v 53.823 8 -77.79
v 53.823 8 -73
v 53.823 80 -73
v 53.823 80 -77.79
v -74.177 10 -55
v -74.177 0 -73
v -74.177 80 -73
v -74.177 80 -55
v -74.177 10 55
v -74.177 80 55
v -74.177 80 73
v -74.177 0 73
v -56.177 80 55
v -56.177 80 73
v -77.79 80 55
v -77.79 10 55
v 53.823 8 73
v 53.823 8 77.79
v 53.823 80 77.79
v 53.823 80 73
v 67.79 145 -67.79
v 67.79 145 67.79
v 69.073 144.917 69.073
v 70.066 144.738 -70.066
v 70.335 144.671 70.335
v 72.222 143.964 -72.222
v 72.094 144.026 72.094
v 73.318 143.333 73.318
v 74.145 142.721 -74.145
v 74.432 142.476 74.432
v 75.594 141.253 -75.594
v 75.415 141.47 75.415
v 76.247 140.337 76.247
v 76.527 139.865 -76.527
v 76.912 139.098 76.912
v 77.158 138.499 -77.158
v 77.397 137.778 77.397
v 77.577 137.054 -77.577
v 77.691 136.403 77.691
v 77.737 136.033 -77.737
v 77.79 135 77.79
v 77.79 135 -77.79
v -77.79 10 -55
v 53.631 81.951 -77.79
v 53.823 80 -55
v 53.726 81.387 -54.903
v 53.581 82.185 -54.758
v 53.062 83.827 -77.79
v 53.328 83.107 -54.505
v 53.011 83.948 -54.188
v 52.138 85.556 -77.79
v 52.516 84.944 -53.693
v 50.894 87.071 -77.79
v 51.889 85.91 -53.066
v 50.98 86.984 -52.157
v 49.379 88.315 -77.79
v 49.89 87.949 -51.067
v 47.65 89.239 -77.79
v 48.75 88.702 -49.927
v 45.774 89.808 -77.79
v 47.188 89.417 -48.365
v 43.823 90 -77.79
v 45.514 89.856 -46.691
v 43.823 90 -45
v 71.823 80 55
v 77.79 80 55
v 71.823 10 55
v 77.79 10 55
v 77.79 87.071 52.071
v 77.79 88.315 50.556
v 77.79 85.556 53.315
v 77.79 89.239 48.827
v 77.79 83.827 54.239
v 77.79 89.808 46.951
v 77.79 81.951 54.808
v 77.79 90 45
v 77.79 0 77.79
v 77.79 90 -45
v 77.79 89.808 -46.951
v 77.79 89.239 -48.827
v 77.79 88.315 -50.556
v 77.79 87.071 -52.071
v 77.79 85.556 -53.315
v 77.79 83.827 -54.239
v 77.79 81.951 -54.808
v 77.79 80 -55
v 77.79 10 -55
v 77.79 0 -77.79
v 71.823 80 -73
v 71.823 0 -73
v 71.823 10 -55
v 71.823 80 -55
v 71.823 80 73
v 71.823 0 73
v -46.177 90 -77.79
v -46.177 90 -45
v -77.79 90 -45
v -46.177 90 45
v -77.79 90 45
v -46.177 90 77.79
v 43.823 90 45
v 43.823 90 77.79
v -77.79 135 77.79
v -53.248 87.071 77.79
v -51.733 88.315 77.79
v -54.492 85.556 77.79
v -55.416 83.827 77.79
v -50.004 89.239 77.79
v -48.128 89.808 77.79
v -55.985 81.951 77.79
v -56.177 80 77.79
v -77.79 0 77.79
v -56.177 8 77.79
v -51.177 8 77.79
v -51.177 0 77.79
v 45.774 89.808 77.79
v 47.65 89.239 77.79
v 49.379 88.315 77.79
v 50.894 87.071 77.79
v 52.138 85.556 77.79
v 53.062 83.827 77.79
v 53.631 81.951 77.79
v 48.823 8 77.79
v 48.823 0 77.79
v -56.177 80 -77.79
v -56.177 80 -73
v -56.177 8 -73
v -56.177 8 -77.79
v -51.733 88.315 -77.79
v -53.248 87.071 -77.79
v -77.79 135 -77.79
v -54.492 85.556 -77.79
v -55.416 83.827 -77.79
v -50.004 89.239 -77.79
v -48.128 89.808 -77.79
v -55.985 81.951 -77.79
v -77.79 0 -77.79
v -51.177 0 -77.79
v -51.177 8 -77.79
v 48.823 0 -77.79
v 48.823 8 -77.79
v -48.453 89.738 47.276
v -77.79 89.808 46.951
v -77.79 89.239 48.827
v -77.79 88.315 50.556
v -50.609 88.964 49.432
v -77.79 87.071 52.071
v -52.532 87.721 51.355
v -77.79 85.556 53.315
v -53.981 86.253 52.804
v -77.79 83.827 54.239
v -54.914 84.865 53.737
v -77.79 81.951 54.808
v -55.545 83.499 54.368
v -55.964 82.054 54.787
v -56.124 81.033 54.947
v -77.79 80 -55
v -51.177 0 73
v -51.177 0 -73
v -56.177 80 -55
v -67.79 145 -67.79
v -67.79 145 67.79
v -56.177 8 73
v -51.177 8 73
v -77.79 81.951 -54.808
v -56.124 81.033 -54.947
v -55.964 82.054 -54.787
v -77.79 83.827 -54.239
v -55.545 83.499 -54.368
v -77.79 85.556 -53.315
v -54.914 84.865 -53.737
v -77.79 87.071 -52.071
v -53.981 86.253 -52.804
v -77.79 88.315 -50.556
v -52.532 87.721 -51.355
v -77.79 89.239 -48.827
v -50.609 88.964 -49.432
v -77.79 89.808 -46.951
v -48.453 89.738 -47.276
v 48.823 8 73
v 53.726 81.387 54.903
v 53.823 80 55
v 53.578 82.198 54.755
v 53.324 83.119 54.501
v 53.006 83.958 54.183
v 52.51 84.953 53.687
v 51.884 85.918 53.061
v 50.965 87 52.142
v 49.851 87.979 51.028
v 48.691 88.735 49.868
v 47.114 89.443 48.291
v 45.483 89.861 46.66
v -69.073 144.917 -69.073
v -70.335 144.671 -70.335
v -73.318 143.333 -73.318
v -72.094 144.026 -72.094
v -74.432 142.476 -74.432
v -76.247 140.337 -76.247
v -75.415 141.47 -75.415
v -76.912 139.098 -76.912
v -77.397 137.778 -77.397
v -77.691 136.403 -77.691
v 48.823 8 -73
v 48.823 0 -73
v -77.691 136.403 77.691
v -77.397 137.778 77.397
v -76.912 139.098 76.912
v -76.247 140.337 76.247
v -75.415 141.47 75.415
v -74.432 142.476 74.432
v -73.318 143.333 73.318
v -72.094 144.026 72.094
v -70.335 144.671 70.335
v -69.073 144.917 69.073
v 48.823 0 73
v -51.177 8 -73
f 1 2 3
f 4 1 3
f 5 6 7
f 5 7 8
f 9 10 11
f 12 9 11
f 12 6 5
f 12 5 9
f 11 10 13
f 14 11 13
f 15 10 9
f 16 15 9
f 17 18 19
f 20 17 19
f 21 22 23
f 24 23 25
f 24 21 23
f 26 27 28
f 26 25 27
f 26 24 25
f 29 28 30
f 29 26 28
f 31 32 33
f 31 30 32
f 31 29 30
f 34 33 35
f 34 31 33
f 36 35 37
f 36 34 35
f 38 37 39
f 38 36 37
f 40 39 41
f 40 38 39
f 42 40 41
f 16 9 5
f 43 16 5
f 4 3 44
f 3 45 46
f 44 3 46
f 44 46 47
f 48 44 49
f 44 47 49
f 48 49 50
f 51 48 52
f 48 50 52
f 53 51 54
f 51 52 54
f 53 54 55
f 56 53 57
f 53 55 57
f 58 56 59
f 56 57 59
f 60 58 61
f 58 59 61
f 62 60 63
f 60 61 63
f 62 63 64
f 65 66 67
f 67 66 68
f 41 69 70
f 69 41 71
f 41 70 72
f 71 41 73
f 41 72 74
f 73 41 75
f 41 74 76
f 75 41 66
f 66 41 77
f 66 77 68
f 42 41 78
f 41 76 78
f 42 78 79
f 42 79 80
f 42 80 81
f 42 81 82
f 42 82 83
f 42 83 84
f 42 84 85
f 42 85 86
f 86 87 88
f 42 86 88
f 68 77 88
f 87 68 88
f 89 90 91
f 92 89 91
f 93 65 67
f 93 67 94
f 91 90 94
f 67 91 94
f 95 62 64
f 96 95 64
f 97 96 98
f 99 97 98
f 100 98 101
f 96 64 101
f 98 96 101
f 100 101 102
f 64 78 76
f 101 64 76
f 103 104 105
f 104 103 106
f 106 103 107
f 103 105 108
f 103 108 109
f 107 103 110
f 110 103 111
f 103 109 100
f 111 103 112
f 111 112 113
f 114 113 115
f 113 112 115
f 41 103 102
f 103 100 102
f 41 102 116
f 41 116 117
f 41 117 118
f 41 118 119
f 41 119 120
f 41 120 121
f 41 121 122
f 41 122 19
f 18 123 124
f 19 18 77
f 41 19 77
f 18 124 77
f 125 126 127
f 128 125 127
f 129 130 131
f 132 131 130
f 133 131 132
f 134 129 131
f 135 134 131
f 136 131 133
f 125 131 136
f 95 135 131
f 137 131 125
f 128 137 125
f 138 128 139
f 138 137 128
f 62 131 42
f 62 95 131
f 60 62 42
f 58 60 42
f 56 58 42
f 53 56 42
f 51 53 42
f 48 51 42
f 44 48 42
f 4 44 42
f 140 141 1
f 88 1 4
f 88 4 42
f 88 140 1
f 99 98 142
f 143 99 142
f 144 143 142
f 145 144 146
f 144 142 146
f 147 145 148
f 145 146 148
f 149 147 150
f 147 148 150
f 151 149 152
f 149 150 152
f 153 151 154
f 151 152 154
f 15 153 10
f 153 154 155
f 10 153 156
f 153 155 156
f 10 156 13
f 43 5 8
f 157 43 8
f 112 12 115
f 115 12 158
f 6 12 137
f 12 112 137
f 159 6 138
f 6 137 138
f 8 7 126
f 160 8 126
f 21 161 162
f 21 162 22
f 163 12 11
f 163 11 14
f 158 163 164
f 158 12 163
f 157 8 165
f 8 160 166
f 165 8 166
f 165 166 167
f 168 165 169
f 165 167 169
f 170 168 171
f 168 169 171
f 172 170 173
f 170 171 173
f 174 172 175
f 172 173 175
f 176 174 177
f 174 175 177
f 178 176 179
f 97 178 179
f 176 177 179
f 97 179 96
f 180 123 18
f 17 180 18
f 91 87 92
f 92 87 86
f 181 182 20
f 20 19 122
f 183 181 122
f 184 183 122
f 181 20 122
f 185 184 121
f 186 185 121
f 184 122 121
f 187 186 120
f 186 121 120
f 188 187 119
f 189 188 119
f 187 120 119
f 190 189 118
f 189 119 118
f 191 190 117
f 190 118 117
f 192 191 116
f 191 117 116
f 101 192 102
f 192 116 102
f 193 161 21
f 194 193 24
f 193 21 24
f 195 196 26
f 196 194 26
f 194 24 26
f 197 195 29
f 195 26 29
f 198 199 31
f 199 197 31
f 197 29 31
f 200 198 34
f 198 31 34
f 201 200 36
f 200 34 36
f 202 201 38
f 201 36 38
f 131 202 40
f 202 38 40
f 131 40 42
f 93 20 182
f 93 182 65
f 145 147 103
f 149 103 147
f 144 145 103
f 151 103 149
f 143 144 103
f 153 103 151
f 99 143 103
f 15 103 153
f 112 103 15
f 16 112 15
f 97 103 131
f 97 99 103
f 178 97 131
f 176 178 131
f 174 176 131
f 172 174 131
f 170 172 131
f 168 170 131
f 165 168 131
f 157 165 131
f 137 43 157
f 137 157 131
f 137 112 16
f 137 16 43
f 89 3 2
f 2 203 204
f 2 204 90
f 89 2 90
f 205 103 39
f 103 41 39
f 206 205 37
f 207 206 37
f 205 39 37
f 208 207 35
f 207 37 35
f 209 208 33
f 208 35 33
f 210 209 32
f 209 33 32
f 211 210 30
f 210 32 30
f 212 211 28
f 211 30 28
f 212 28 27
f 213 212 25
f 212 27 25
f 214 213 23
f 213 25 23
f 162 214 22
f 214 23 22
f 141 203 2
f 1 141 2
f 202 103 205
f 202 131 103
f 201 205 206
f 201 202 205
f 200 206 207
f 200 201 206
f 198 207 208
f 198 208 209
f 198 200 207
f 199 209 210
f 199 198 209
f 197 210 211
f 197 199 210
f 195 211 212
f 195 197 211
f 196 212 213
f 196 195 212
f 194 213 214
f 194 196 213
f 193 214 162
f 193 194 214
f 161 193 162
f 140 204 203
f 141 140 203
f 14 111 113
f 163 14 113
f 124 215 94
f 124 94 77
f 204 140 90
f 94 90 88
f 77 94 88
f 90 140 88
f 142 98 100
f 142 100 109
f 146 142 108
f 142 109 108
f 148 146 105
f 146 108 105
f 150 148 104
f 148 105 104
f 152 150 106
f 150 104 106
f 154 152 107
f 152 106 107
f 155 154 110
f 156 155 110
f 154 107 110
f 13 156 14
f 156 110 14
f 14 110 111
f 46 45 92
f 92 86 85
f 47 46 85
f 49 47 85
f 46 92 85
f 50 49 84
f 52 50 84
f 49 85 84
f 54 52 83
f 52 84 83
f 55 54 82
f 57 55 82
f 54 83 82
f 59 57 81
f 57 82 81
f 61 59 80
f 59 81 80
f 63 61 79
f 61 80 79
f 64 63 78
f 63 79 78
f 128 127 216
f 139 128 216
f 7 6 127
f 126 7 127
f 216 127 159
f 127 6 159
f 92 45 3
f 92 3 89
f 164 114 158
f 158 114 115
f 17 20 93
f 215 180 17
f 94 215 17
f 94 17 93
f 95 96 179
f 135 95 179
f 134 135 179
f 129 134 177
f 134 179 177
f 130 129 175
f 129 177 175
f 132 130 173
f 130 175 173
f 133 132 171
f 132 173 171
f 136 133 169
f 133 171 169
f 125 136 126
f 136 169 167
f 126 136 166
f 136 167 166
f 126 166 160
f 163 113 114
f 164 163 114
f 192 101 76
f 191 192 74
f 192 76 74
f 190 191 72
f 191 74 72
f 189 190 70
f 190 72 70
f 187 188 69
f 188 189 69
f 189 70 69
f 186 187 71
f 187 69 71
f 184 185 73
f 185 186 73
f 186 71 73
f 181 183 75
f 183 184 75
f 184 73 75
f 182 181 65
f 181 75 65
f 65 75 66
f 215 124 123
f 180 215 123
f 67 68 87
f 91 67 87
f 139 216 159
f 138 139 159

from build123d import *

# Parameters (mm, degrees)
SKETCH1_W           = 155.58
SKETCH1_H           = 155.58
BOSS_EXTRUDE1_DEPTH = 145
CUT_EXTRUDE1_REACH  = 228.454
CUT_EXTRUDE2_DEPTH  = 155.8
SKETCH4_W           = 18
SKETCH4_H           = 18
CUT_EXTRUDE3_DEPTH  = 80
FILLET1_R           = 10
SKETCH5_W           = 18
SKETCH5_H           = 110
CUT_EXTRUDE4_DEPTH  = 10
SKETCH6_W           = 110
SKETCH6_H           = 146
CUT_EXTRUDE5_DEPTH  = 10


with BuildPart() as part:
    # Sketch1 → Boss-Extrude1 (new body)
    with BuildSketch(Plane(origin=(0, 0, 0), x_dir=(1, 0, 0), z_dir=(0, 1, 0))):
        Rectangle(SKETCH1_W, SKETCH1_H)
    extrude(amount=BOSS_EXTRUDE1_DEPTH)

    # Sketch2 → Cut-Extrude1 (cut, up to next)
    with BuildSketch(Plane.XY.offset(77.79), mode=Mode.PRIVATE) as cut_extrude1_sk1:
        with BuildLine():
            Line((43.823001254, 90), (-46.176998746, 90))
            ThreePointArc((-46.176998746, 90), (-53.248066558, 87.071067812), (-56.176998746, 80))
            Line((-56.176998746, 80), (-56.176998746, 8))
            Line((-56.176998746, 8), (-51.176998746, 8))
            Line((-51.176998746, 8), (-51.176998746, 0))
            Line((-51.176998746, 0), (48.823001254, 0))
            Line((48.823001254, 0), (48.823001254, 8))
            Line((48.823001254, 8), (53.823001254, 8))
            Line((53.823001254, 8), (53.823001254, 80))
            ThreePointArc((53.823001254, 80), (50.894069065, 87.071067812), (43.823001254, 90))
        make_face()
    cut_extrude1_tool1 = extrude(cut_extrude1_sk1.sketch, amount=-CUT_EXTRUDE1_REACH, mode=Mode.PRIVATE) & part.part
    add(cut_extrude1_tool1.solids().sort_by_distance((-1.176999, 45.147739, 77.79))[0], mode=Mode.SUBTRACT)

    # Sketch3 → Cut-Extrude2 (cut)
    with BuildSketch(Plane(origin=(77.79, 0, 0), x_dir=(0, 0, -1), z_dir=(1, 0, 0))):
        with BuildLine():
            Line((-55, 80), (-55, 10))
            Line((-55, 10), (55, 10))
            Line((55, 10), (55, 80))
            ThreePointArc((55, 80), (52.071067812, 87.071067812), (45, 90))
            Line((45, 90), (-45, 90))
            ThreePointArc((-45, 90), (-52.071067812, 87.071067812), (-55, 80))
        make_face()
    extrude(amount=-CUT_EXTRUDE2_DEPTH, mode=Mode.SUBTRACT)

    # Sketch4 → Cut-Extrude3 (cut)
    with BuildSketch(Plane.XZ):
        with Locations((62.823001254, -64)):
            Rectangle(SKETCH4_W, SKETCH4_H)
        with Locations((-65.176998746, -64)):
            Rectangle(SKETCH4_W, SKETCH4_H)
        with Locations((62.823001254, 64)):
            Rectangle(SKETCH4_W, SKETCH4_H)
        with Locations((-65.176998746, 64)):
            Rectangle(SKETCH4_W, SKETCH4_H)
    extrude(amount=-CUT_EXTRUDE3_DEPTH, mode=Mode.SUBTRACT)

    # Fillet1
    fillet1_edges = [part.edges().sort_by_distance(p)[0] for p in [
        (-77.79, 145, 0),
        (0, 145, 77.79),
        (77.79, 145, 0),
        (0, 145, -77.79),
    ]]
    fillet(fillet1_edges, radius=FILLET1_R)

    # Sketch5 → Cut-Extrude4 (cut)
    with BuildSketch(Plane.XZ):
        with Locations((-65.176998746, 0)):
            Rectangle(SKETCH5_W, SKETCH5_H)
        with Locations((62.823001254, 0)):
            Rectangle(SKETCH5_W, SKETCH5_H)
    extrude(amount=-CUT_EXTRUDE4_DEPTH, mode=Mode.SUBTRACT)

    # Sketch6 → Cut-Extrude5 (cut)
    with BuildSketch(Plane.XZ):
        with Locations((-1.176998746, 0)):
            Rectangle(SKETCH6_W, SKETCH6_H)
    extrude(amount=-CUT_EXTRUDE5_DEPTH, mode=Mode.SUBTRACT)


solid = part.part
